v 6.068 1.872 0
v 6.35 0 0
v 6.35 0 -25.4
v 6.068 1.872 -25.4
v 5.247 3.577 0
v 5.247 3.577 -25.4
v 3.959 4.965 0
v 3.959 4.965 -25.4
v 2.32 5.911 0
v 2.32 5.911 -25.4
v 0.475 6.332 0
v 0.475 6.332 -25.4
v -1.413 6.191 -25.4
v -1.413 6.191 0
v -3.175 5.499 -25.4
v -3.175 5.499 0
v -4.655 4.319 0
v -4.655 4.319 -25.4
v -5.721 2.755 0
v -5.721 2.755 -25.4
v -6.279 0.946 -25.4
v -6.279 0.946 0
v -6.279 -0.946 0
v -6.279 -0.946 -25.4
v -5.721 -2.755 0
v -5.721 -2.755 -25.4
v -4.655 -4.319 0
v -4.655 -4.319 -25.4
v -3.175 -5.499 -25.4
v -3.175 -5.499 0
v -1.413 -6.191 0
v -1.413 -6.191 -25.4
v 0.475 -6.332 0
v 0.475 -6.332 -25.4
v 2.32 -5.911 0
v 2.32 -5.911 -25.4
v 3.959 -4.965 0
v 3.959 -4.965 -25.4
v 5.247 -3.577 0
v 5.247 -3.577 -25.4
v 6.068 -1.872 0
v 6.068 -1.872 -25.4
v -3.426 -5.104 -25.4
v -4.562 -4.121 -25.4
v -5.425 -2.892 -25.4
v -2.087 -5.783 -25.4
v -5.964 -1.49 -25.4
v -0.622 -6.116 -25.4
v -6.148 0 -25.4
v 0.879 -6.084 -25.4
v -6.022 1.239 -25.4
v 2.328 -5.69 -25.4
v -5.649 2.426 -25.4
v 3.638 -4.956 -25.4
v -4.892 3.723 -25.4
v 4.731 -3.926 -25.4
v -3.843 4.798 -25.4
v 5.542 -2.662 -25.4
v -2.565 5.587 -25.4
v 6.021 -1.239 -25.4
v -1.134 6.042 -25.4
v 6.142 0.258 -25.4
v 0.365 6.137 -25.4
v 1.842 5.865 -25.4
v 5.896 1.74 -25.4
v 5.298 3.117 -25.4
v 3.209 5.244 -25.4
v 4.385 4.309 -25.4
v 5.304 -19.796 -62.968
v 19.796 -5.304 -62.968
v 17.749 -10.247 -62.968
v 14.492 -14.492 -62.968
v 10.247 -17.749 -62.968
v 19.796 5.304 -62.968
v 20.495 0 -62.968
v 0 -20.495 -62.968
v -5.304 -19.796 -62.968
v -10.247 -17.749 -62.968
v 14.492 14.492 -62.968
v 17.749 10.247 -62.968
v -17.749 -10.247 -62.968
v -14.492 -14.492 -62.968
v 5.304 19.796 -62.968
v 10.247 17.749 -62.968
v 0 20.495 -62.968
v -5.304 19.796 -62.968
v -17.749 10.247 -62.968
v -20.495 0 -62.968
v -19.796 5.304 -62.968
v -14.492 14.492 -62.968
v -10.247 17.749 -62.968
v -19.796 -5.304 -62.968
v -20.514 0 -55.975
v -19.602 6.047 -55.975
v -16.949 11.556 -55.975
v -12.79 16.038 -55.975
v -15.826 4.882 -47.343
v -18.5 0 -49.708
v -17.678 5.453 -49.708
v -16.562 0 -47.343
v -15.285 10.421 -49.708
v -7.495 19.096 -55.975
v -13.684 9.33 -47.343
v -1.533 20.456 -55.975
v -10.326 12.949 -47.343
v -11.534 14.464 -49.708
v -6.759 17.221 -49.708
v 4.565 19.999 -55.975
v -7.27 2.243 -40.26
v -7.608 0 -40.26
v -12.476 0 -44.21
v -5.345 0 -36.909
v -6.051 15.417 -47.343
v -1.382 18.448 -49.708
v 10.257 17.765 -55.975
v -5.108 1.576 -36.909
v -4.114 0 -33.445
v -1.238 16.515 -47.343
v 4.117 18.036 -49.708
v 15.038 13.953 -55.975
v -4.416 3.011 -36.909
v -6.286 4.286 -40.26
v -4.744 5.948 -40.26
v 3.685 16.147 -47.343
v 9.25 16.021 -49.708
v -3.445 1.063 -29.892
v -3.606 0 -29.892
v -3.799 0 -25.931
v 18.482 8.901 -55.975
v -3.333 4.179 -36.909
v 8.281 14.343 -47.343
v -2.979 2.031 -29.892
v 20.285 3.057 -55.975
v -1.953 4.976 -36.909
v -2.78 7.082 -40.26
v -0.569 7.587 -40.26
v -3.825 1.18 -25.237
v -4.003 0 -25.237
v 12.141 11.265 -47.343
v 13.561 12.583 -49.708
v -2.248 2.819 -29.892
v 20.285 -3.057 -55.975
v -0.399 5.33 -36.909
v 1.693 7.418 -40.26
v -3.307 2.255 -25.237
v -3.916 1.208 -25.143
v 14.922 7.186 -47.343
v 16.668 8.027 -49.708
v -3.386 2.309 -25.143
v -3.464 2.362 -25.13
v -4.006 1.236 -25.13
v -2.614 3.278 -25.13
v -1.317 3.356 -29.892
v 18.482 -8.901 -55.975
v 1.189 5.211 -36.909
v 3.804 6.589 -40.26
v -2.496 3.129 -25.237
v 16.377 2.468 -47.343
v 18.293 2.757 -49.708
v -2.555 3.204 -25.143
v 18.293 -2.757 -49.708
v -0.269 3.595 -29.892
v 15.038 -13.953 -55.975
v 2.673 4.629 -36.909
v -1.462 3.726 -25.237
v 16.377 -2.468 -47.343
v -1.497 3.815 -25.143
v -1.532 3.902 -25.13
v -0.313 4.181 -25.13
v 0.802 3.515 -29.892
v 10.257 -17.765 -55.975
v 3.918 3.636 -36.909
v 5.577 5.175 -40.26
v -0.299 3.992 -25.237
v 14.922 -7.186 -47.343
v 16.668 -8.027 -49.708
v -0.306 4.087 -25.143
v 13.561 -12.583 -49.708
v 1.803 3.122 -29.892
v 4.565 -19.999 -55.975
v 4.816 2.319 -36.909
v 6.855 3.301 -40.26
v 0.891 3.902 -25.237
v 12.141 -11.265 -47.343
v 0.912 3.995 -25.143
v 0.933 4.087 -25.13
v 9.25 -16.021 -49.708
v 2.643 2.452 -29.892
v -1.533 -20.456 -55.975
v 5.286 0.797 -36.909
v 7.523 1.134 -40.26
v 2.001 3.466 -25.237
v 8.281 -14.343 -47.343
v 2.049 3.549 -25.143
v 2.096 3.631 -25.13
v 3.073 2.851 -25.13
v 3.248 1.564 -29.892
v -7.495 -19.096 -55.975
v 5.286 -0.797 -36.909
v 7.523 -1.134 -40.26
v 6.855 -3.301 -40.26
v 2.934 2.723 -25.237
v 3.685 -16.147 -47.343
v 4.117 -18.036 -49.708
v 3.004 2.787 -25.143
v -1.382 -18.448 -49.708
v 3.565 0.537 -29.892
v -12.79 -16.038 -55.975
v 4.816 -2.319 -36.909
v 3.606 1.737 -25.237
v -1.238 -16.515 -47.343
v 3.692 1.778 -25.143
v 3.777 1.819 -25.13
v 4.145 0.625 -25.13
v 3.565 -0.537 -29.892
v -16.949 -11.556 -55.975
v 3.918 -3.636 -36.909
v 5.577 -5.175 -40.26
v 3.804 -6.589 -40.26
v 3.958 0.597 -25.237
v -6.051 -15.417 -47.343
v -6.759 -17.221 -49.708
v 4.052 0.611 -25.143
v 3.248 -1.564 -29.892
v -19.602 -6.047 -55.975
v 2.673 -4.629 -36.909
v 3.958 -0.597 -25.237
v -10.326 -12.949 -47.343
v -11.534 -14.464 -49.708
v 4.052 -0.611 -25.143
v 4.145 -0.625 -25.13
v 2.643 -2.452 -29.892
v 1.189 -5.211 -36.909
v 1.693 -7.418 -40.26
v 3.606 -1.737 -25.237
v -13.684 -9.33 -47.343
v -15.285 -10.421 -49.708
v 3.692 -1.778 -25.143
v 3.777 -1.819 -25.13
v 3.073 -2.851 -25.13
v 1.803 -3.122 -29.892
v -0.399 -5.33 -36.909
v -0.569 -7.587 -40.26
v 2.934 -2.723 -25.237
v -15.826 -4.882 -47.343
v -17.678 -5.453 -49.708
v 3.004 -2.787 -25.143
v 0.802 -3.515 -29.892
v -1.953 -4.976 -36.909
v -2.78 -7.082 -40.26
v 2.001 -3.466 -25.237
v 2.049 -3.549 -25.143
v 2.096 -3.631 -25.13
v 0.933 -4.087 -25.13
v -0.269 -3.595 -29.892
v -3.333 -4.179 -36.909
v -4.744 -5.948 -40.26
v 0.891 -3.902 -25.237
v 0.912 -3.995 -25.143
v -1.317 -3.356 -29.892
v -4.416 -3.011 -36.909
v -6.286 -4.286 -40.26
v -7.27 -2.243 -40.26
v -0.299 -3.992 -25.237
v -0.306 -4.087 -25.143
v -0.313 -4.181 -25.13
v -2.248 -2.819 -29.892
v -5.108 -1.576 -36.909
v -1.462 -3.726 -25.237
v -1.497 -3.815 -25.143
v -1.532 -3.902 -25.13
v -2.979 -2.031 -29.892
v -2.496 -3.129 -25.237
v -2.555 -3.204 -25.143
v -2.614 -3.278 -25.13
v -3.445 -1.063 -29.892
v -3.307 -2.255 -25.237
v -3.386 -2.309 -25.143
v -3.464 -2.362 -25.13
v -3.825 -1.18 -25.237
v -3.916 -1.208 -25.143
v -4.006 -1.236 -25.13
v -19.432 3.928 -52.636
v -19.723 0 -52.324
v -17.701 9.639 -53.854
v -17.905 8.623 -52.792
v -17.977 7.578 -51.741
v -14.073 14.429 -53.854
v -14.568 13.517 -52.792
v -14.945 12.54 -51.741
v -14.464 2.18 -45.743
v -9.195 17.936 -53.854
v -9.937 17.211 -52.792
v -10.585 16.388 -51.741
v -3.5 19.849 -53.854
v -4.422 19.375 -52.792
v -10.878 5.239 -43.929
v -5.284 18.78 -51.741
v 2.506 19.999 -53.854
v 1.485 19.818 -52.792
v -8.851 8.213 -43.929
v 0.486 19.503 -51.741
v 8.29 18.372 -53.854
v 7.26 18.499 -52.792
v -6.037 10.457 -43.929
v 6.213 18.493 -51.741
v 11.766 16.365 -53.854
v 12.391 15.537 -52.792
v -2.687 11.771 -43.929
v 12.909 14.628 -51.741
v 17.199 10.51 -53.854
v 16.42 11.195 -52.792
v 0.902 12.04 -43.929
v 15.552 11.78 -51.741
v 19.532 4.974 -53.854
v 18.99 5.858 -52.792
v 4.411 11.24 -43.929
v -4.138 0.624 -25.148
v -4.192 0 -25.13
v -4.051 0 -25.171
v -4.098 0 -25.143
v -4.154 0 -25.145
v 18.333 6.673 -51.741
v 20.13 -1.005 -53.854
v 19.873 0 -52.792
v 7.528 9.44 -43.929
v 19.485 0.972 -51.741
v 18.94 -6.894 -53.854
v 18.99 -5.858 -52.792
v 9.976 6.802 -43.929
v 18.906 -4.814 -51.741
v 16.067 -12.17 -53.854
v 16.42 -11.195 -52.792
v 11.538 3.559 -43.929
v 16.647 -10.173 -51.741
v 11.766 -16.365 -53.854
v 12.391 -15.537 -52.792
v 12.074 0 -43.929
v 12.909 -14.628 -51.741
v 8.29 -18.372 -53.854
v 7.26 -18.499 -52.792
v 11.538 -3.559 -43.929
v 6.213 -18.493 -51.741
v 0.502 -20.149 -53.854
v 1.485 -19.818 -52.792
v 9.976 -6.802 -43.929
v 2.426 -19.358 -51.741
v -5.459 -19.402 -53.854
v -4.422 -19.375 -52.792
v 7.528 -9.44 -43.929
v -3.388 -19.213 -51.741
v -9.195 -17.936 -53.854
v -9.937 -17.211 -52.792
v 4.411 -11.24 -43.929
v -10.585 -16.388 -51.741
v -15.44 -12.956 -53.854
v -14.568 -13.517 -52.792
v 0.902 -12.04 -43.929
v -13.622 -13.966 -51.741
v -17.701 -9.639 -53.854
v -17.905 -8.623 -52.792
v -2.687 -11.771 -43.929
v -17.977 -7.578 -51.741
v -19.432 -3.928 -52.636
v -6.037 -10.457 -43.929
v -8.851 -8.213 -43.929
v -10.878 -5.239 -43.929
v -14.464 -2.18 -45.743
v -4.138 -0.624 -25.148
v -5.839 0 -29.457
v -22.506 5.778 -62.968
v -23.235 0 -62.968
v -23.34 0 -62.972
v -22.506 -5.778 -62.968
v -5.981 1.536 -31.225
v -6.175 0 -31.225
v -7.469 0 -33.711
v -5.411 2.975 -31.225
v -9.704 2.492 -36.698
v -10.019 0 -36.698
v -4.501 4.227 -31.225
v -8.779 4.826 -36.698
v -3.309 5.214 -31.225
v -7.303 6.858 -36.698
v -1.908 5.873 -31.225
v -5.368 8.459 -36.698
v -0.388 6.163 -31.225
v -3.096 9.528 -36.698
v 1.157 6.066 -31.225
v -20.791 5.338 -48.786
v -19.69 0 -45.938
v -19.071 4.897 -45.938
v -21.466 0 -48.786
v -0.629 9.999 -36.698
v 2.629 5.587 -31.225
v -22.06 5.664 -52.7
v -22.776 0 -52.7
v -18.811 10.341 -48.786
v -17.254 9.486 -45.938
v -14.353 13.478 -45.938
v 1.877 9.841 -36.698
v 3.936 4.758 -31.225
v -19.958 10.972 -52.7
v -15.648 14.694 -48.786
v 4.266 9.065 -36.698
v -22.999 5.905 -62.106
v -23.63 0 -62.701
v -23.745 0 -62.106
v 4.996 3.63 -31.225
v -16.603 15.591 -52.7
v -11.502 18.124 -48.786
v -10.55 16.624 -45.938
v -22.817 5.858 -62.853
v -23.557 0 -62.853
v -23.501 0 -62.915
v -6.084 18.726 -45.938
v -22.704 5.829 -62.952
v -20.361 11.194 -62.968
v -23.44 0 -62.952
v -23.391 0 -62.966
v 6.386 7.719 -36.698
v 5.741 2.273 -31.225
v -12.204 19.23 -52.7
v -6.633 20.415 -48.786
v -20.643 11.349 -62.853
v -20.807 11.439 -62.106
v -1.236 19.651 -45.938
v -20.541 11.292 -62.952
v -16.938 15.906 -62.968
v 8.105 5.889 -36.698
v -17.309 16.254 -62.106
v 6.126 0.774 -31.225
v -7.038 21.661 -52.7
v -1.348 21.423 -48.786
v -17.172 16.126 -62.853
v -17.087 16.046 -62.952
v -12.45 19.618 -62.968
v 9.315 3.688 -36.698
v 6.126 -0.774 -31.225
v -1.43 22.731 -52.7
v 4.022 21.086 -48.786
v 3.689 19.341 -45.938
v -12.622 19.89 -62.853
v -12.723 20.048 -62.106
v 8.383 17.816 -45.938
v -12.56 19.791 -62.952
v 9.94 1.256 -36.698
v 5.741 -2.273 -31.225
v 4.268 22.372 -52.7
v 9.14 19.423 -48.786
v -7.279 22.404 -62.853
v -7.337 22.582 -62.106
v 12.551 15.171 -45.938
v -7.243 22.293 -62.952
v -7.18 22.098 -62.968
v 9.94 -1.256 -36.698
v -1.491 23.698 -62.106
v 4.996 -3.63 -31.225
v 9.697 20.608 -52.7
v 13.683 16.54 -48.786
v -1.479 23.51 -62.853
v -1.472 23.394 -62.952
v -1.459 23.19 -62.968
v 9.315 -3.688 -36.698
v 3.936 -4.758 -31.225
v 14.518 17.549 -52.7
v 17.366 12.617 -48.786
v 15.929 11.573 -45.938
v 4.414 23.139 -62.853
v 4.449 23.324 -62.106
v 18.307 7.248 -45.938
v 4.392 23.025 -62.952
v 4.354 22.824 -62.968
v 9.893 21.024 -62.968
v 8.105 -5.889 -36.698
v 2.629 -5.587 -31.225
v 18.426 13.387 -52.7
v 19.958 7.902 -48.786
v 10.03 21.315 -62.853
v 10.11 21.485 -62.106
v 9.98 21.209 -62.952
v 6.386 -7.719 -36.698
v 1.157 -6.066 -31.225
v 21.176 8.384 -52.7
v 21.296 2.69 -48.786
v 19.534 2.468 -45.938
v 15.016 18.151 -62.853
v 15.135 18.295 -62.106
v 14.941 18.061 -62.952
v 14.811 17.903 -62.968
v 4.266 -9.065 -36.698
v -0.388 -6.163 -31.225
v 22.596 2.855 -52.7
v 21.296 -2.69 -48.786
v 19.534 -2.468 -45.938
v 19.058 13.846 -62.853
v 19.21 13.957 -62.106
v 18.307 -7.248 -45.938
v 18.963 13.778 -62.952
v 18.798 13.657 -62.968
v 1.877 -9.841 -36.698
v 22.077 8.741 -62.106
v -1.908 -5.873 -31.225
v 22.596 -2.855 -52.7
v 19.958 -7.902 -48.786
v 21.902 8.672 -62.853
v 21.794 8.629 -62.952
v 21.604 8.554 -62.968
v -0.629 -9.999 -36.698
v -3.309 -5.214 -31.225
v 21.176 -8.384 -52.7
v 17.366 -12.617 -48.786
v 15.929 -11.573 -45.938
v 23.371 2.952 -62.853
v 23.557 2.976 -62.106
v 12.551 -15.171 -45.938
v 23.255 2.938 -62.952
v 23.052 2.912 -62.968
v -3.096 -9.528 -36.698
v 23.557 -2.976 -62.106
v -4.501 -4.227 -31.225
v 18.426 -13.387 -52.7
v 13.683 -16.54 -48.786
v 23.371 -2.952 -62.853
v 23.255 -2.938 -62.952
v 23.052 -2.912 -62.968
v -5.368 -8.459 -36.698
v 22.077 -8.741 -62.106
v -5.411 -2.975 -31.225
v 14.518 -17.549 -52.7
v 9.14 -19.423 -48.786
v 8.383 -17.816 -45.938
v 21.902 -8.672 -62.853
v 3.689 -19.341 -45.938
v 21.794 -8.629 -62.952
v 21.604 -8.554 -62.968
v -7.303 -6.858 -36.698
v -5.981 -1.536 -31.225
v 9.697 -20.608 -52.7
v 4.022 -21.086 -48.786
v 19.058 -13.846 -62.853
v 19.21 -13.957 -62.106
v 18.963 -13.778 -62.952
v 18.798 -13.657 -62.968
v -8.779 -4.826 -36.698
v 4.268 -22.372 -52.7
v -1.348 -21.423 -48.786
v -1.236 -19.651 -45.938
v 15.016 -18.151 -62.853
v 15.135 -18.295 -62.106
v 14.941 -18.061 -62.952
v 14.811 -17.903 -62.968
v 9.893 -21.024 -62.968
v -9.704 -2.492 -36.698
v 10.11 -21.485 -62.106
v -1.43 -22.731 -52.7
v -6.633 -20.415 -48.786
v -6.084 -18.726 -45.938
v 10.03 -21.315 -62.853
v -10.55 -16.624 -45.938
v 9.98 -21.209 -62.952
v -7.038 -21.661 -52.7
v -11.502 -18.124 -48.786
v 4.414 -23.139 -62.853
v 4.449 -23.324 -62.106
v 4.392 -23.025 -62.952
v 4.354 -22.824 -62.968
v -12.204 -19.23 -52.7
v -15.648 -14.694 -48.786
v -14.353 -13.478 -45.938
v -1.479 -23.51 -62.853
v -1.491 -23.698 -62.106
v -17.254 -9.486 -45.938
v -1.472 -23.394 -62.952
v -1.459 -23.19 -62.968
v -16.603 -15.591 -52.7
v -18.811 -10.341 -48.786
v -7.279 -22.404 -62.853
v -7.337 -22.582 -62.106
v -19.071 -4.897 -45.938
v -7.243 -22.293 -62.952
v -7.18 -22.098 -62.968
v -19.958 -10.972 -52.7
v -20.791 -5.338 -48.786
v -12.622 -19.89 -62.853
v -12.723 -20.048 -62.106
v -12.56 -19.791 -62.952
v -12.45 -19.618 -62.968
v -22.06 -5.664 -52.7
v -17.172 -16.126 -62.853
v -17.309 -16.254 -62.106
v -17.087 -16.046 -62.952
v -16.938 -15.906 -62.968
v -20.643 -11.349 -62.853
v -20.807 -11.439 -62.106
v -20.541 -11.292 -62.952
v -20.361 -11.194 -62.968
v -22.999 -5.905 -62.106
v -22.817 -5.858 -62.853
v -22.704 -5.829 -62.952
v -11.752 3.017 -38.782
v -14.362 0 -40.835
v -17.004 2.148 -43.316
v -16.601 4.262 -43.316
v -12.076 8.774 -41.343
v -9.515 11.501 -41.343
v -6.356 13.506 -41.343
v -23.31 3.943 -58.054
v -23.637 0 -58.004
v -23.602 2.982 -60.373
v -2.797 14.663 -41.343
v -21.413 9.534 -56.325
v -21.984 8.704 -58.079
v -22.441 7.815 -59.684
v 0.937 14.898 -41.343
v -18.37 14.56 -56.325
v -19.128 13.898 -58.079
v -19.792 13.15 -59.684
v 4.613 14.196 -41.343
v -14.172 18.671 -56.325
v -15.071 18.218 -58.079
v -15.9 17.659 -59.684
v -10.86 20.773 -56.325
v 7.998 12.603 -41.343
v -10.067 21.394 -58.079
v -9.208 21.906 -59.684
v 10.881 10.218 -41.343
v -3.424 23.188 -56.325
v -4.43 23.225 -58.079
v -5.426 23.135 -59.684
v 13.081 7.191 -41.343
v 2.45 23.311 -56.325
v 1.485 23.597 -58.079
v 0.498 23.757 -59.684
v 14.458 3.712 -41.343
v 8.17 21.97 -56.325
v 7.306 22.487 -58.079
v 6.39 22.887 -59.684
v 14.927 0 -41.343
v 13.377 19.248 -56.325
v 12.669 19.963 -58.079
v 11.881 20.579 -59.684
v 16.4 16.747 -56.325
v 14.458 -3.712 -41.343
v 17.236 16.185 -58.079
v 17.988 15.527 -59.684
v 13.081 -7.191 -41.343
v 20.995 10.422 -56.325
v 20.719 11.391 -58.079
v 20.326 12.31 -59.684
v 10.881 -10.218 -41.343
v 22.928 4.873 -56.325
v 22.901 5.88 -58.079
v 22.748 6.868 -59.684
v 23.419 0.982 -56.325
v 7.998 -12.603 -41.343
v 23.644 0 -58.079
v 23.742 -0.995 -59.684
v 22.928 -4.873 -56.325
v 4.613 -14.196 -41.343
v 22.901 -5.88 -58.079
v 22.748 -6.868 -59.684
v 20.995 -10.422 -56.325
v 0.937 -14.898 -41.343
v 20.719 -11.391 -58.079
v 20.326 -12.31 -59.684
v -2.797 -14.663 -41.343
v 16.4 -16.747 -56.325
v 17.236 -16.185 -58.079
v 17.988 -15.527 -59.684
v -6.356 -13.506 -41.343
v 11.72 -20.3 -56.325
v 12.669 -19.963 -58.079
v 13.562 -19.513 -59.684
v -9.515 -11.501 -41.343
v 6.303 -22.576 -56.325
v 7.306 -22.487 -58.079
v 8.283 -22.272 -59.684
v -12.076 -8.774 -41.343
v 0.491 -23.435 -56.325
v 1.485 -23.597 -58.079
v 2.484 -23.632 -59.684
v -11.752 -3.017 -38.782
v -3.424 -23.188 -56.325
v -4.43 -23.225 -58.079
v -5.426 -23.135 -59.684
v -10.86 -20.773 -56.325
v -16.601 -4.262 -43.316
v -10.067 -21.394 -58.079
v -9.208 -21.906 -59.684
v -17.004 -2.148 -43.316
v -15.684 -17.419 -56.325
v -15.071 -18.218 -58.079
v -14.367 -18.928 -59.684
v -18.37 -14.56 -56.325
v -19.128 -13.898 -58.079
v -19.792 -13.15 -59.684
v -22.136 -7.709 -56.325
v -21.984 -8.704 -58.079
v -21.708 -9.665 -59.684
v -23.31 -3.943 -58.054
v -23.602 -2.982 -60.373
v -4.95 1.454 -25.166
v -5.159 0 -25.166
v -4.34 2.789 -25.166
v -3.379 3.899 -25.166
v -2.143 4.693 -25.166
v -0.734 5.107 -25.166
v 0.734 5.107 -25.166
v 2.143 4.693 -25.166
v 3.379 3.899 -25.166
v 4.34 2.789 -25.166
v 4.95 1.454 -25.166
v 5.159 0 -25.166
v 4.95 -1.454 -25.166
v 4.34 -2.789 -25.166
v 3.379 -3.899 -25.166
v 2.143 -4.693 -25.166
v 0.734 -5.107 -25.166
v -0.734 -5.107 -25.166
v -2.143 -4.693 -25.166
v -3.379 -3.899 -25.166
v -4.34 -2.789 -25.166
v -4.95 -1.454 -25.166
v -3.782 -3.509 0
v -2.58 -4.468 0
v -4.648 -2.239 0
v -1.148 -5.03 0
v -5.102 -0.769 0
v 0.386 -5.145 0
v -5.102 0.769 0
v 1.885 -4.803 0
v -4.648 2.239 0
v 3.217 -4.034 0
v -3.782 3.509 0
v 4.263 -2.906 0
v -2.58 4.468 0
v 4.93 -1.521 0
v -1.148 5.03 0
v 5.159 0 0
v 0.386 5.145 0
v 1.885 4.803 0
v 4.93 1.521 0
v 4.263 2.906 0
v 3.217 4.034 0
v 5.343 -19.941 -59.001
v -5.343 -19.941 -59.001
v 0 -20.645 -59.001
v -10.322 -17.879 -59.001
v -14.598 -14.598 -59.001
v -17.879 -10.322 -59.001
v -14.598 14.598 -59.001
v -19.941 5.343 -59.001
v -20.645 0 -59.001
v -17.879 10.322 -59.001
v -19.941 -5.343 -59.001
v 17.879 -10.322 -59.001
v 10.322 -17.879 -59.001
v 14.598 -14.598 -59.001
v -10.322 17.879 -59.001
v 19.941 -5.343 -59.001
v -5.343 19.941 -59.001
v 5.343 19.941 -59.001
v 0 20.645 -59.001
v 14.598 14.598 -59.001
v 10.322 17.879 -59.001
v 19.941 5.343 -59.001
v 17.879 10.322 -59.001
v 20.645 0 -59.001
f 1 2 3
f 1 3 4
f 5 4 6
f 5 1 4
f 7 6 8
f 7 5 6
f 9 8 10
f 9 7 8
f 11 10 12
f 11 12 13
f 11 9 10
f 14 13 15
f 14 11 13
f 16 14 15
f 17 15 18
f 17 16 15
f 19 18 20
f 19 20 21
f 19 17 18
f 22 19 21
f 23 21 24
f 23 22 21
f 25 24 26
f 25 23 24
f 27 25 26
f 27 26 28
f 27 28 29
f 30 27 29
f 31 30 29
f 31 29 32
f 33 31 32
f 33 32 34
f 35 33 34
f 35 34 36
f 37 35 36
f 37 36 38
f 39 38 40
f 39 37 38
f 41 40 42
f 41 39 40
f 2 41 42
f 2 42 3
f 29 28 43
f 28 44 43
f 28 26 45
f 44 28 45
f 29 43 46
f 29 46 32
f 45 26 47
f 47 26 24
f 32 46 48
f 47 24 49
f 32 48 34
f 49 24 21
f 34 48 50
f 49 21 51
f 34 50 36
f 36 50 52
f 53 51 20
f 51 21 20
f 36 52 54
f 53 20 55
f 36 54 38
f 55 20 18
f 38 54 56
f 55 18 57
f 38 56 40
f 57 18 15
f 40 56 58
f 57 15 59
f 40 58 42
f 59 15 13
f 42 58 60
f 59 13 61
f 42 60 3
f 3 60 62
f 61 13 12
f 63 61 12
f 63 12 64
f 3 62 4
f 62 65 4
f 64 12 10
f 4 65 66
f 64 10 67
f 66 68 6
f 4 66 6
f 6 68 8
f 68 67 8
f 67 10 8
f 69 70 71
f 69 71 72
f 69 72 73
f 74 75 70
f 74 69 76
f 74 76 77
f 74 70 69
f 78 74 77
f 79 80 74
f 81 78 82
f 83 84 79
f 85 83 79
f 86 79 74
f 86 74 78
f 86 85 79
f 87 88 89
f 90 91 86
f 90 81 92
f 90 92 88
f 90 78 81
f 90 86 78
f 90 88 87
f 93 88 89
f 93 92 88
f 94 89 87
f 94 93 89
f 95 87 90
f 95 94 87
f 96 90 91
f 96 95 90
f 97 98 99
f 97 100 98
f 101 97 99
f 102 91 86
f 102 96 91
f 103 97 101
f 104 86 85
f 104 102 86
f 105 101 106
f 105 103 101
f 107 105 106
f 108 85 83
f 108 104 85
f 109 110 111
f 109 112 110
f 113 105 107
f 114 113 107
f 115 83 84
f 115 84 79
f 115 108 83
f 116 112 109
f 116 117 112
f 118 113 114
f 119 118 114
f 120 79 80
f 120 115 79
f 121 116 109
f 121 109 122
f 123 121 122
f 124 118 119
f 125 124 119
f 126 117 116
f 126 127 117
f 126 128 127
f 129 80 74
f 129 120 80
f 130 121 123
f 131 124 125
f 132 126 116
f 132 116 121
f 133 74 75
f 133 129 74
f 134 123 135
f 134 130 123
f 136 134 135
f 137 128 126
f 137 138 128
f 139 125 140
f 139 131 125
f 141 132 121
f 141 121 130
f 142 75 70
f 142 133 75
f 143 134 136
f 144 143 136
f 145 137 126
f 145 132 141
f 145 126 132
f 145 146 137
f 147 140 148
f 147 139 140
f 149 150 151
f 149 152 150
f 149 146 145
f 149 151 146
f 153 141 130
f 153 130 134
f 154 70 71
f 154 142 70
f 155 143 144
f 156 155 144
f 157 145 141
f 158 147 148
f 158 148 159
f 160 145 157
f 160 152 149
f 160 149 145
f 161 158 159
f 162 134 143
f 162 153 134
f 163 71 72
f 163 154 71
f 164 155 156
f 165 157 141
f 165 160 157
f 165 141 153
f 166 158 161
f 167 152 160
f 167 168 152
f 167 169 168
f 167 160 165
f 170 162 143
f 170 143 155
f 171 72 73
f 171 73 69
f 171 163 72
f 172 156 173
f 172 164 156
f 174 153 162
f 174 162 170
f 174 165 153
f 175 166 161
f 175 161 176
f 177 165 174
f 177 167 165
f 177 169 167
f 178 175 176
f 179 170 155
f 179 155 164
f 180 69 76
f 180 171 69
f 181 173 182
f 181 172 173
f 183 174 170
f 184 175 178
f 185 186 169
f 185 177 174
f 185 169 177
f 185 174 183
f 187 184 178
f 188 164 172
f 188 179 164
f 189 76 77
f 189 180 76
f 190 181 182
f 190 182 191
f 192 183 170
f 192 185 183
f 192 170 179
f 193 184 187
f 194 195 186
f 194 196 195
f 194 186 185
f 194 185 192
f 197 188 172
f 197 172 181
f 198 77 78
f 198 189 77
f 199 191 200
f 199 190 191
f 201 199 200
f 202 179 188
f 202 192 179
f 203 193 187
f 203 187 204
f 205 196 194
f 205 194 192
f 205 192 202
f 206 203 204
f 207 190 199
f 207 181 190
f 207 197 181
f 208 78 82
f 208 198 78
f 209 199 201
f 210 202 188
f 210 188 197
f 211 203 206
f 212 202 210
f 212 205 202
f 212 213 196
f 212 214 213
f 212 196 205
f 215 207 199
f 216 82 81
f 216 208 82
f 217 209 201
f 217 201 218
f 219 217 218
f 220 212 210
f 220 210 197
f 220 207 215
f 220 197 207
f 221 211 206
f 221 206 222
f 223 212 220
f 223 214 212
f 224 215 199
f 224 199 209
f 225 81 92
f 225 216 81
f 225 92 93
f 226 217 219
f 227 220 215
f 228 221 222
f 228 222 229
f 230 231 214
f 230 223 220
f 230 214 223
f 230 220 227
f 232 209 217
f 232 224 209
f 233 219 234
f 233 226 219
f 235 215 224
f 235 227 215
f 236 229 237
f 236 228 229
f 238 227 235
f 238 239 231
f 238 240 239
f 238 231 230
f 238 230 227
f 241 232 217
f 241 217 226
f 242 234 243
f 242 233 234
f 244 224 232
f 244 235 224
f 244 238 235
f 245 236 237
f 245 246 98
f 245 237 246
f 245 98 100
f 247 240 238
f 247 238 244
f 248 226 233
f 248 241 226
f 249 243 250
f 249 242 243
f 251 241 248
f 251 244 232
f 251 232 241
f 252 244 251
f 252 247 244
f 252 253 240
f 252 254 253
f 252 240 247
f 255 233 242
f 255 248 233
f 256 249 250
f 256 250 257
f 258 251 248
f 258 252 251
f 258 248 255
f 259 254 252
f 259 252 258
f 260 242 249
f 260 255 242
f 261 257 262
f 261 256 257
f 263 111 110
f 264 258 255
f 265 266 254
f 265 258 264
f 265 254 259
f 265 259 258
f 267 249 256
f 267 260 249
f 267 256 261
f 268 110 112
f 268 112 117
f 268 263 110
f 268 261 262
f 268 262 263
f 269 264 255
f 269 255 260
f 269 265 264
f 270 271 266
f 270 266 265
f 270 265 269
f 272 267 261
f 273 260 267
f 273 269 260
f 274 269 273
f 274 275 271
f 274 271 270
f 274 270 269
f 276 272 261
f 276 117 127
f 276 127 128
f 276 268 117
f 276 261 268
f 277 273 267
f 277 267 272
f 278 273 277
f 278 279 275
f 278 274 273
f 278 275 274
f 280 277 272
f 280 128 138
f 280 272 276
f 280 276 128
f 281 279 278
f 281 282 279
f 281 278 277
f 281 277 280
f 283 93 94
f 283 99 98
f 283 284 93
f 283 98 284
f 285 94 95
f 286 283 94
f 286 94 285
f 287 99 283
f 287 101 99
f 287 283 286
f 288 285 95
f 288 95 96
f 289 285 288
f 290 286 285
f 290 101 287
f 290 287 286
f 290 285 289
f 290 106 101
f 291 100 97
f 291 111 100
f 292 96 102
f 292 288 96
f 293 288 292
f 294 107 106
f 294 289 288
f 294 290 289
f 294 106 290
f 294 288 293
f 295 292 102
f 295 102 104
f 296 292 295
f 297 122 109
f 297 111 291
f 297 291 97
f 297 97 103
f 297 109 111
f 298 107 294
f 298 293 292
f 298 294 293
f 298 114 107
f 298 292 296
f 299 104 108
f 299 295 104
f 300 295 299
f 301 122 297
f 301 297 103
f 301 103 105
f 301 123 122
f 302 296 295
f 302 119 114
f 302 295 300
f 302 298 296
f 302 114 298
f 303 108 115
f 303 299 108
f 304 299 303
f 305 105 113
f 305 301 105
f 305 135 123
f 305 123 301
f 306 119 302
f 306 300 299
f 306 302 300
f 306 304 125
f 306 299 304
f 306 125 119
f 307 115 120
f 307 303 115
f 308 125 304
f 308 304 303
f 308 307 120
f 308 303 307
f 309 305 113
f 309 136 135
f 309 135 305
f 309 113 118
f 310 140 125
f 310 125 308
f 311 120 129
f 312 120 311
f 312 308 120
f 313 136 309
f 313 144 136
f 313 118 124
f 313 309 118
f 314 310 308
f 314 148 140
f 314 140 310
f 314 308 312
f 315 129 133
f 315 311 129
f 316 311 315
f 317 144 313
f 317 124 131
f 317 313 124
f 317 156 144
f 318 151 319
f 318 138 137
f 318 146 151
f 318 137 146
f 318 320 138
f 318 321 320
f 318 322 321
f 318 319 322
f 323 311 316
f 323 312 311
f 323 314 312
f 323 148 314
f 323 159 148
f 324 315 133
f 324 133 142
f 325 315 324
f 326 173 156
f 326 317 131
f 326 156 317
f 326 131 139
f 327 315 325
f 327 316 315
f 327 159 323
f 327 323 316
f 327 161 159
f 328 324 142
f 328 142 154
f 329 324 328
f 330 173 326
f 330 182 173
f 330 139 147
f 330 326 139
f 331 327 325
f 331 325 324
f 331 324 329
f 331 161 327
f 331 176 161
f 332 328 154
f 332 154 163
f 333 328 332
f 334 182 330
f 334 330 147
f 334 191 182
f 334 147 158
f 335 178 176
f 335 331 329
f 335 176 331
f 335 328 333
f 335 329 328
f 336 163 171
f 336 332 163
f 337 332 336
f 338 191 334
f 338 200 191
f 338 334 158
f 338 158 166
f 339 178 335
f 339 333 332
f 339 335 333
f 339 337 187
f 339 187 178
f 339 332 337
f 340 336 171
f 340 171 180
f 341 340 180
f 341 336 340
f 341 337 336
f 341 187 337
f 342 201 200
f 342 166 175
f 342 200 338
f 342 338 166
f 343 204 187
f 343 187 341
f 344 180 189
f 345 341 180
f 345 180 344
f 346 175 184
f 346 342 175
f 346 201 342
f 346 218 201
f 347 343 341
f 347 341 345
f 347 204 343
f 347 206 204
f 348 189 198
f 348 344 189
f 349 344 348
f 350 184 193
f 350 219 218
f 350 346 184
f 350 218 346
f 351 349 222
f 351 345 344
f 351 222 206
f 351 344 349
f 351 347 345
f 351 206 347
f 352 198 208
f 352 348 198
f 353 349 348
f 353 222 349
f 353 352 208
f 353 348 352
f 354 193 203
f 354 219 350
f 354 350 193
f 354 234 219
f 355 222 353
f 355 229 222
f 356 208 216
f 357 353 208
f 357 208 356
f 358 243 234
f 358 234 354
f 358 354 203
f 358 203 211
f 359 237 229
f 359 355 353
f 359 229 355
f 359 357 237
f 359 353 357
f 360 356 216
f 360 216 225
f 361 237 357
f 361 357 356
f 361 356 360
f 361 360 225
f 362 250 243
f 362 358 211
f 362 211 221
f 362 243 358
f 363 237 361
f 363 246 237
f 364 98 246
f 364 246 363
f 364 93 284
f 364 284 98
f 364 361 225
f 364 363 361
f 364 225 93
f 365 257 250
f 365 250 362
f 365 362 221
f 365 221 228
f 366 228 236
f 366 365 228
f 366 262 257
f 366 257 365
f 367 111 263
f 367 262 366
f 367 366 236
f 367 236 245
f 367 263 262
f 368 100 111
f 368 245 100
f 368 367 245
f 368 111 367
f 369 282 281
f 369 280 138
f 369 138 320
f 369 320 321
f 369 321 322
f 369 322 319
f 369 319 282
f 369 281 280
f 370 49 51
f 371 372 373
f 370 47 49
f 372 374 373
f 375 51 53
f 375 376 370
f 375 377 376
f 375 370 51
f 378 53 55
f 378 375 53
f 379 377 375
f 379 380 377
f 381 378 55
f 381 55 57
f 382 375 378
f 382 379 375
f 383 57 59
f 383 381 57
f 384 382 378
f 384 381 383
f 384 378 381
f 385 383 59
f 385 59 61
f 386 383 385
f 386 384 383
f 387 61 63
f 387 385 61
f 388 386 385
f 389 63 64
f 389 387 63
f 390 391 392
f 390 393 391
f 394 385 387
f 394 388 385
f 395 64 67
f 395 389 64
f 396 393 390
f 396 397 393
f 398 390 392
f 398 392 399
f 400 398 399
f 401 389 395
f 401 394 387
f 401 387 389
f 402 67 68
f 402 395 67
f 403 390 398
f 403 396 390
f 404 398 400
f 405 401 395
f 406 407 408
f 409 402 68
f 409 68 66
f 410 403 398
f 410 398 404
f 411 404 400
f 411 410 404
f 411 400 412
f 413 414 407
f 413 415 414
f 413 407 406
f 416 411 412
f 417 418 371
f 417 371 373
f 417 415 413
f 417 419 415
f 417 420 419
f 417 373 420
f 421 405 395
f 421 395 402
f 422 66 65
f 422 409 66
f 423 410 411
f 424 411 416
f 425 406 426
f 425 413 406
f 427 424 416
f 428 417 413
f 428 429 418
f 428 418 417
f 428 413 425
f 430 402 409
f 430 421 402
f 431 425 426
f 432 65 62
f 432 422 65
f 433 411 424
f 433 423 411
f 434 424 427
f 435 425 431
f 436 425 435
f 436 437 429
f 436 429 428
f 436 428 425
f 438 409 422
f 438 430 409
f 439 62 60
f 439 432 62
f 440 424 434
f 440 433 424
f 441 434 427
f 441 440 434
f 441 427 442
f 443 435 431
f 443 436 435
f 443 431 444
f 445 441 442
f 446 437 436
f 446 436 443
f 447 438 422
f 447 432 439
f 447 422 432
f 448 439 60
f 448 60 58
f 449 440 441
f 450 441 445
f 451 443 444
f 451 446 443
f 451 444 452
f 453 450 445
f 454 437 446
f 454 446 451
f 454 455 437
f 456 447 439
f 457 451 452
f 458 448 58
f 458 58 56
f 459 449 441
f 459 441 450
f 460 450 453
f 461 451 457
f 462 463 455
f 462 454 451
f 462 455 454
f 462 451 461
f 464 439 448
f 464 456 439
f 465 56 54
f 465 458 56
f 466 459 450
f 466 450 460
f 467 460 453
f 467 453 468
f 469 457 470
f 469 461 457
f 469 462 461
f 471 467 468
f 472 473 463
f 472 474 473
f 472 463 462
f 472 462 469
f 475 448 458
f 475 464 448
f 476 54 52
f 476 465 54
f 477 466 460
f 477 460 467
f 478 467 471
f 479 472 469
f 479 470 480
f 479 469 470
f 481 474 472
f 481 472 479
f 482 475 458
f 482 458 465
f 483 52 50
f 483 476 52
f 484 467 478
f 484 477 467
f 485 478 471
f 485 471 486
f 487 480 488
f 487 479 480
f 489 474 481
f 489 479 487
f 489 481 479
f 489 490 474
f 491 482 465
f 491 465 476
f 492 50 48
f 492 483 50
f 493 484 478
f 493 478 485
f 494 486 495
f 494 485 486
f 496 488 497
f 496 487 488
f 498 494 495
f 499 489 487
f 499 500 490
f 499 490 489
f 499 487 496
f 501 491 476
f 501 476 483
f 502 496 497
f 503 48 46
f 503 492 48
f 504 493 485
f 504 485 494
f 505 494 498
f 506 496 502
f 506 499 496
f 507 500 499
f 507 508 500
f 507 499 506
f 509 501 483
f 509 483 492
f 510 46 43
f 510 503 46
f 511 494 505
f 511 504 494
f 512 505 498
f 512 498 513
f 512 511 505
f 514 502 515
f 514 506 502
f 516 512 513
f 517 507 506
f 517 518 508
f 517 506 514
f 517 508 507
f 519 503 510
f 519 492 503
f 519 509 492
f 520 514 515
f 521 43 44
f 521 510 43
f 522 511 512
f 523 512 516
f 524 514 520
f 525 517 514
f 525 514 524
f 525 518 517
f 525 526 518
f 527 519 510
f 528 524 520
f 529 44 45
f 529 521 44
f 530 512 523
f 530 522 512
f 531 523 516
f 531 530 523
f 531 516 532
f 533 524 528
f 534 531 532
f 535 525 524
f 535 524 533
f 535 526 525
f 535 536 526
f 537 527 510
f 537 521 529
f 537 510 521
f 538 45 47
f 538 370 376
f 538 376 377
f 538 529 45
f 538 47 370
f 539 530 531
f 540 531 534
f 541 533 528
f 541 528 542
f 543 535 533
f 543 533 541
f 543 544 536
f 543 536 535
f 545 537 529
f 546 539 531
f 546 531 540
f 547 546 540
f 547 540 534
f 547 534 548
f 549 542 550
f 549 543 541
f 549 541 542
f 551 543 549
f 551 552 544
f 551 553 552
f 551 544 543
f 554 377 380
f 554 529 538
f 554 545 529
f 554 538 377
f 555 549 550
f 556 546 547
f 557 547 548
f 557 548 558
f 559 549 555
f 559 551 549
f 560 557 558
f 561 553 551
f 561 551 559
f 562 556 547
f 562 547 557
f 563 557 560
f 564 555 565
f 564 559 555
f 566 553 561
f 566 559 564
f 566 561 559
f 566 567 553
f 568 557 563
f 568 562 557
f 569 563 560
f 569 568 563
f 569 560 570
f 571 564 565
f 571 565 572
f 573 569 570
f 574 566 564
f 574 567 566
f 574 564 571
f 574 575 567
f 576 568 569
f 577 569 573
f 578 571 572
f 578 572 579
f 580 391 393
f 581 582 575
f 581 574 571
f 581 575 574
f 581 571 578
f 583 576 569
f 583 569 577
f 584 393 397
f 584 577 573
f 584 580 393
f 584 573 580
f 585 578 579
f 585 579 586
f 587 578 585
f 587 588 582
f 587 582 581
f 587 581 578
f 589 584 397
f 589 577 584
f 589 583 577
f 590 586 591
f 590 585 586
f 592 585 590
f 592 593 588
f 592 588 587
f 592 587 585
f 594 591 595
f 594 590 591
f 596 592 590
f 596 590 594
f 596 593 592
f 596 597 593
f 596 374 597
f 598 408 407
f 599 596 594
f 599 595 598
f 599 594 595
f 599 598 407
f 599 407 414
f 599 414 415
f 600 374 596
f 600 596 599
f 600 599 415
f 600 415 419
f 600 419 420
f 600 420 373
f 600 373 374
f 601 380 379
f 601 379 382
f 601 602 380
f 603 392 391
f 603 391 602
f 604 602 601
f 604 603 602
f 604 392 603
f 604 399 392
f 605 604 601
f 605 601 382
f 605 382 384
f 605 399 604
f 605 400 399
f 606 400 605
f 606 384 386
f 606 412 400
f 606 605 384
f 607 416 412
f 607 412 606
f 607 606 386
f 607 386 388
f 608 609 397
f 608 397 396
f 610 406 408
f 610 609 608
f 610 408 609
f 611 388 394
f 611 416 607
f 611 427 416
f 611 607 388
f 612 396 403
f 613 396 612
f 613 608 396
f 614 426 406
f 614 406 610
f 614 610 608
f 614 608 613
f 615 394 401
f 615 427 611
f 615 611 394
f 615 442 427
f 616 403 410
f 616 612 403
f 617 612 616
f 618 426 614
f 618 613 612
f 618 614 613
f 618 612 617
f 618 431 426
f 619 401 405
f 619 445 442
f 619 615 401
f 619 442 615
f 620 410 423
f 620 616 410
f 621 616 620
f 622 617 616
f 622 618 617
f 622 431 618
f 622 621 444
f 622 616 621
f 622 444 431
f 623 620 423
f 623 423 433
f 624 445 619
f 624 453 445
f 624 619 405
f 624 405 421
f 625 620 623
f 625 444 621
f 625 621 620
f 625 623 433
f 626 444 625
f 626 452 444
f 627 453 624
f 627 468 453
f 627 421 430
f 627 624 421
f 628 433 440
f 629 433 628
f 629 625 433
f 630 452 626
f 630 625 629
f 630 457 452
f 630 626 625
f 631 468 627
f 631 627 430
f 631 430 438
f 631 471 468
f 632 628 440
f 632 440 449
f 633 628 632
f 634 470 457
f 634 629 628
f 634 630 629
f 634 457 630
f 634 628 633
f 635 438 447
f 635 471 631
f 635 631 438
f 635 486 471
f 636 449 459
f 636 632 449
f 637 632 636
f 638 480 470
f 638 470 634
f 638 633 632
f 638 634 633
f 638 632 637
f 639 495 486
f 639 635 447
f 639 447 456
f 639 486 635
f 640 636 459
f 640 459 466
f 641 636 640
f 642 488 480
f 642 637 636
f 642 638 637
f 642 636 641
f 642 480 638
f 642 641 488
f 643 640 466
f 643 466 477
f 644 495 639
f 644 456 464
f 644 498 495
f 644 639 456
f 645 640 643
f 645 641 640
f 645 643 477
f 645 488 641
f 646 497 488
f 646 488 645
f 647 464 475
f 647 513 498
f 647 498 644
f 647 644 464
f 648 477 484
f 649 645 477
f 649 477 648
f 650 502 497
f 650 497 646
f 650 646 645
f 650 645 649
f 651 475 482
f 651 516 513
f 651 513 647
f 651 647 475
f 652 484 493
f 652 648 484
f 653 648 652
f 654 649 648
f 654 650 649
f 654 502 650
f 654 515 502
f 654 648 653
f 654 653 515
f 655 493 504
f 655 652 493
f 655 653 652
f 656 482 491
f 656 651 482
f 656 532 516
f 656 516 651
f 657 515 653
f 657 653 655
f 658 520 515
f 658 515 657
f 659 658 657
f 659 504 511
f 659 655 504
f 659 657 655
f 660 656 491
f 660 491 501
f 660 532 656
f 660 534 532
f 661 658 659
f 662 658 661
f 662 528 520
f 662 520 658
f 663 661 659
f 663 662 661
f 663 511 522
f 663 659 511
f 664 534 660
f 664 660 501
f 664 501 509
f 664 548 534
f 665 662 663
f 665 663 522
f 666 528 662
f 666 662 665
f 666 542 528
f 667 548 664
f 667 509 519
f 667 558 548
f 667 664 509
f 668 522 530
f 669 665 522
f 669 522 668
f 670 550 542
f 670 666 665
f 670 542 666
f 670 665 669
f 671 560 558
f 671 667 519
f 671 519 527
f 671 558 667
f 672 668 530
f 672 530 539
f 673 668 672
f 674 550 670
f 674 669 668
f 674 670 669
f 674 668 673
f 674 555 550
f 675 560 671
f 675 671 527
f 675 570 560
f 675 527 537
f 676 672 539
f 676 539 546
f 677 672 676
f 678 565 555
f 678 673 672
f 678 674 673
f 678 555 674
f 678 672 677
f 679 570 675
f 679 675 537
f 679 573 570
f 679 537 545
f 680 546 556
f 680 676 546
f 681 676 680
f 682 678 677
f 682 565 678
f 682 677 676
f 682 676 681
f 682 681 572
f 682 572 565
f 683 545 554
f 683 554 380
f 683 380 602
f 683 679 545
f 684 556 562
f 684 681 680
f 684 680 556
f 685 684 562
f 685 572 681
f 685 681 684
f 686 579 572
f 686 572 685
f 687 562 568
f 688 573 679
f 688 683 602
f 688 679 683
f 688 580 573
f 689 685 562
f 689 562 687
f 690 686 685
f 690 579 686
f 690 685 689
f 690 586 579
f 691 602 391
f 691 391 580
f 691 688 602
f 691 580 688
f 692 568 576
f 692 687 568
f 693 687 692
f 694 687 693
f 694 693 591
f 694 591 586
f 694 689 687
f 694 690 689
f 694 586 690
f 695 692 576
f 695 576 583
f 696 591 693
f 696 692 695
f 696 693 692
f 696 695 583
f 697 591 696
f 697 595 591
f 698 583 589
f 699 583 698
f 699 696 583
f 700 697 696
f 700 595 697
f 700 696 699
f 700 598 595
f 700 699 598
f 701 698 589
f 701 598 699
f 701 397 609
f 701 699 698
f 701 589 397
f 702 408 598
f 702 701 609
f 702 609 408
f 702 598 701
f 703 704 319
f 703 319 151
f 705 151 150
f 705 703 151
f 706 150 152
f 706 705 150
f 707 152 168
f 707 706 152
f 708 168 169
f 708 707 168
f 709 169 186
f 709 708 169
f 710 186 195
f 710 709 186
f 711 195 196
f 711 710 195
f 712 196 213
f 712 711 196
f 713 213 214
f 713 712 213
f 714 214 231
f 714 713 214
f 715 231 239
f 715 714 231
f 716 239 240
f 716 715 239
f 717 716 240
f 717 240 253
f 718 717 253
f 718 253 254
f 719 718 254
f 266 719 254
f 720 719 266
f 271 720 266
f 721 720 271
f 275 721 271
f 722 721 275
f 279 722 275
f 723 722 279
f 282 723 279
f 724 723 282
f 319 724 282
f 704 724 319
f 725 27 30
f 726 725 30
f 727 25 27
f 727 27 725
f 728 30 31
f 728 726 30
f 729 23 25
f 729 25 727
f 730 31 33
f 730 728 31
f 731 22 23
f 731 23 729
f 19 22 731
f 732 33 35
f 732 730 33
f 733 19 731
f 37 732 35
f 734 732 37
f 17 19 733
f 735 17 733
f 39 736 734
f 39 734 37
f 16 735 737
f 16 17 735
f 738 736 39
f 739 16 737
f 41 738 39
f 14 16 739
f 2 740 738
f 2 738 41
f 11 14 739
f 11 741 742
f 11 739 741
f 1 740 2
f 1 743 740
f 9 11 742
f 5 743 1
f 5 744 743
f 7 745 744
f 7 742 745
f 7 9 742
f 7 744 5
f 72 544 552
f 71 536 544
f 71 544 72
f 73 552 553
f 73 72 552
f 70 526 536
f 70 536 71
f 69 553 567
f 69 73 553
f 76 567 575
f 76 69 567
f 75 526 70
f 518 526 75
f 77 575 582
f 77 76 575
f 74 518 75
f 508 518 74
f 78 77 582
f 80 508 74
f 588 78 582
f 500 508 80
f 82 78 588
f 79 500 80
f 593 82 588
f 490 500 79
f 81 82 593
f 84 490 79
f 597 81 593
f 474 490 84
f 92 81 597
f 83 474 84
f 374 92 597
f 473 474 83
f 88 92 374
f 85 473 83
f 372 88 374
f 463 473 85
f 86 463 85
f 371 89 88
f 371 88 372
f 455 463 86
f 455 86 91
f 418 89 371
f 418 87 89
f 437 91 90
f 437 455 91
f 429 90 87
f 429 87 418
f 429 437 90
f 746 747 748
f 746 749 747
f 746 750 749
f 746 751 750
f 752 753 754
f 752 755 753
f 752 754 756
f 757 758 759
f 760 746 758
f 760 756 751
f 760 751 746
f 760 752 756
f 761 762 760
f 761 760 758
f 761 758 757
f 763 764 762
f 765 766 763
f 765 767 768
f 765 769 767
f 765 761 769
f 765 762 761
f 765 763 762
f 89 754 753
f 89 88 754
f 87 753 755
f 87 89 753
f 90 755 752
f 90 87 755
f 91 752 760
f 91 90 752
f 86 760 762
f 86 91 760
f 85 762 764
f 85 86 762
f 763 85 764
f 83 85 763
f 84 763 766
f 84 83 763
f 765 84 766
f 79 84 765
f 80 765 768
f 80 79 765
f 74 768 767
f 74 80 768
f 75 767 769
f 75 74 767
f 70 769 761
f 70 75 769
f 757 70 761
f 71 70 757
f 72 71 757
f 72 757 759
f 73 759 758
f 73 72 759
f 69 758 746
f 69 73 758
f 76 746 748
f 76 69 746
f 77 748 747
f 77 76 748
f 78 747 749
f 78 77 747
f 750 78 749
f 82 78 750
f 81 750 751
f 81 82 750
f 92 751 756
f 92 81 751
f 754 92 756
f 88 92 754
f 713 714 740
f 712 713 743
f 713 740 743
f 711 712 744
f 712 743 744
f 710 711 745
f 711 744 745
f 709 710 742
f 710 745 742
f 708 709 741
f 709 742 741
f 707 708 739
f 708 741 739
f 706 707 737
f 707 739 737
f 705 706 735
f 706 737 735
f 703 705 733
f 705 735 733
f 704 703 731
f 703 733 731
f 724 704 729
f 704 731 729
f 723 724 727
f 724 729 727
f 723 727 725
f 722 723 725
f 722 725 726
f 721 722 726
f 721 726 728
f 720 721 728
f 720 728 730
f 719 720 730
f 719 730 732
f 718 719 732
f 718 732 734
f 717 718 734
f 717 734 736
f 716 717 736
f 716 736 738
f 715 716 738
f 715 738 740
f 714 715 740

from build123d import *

# Parameters (mm, degrees)
F0_R     = 6.35
F0_R_2   = 5.159236224
F1_DEPTH = 25.4


with BuildPart() as f1:
    # F0 (on Top) → F1 (new body)
    with BuildSketch(Plane.XY):
        Circle(F0_R)
        Circle(F0_R_2, mode=Mode.SUBTRACT)
    extrude(amount=-F1_DEPTH)

    # F2 (on Front) → F3 (revolve)
    with BuildSketch(Plane.XZ):
        with BuildLine():
            Line((-4.1922661476, -25.1300428063), (-6.1774905771, -25.2033080906))
            add(Edge.make_bspline(
                [(-6.1774905771, -25.2033080906), (-5.8816901728, -27.1447096862), (-5.265303085, -31.1901905517), (-9.7481884082, -36.7369563101), (-16.6138781886, -42.8504666243), (-23.2235490745, -48.7039542033), (-24.2056607787, -63.0380862229), (-23.3609294322, -62.977042473), (-23.2354998589, -62.9679784179)],
                knots=[0, 0, 0, 0, 0.156554679, 0.3262276903, 0.5234958336, 0.7281329257, 0.9596319336, 1, 1, 1, 1], degree=3))
            Line((-23.2354998589, -62.9679784179), (-20.4945225269, -62.9679784179))
            add(Edge.make_bspline(
                [(-20.4945225269, -62.9679784179), (-20.6448482141, -60.624451722), (-20.9589297237, -55.7280270615), (-18.2599448452, -46.8433730683), (-6.1501049149, -41.3581316698), (-3.0279588772, -30.9205125456), (-3.8334857362, -24.9599734502), (-4.1873255513, -25.1639760168), (-4.1910948215, -25.1380877569), (-4.1922661476, -25.1300428063)],
                knots=[0, 0, 0, 0, 0.1774907083, 0.3708384814, 0.6049164544, 0.8251216274, 0.9695417285, 0.9905348876, 1, 1, 1, 1], degree=3))
        make_face()
    revolve(axis=Axis((0, 0, -40.8029872924), (0, 0, -1)))


with BuildPart() as f4:
    # F2 (on Front) → F4 (revolve)
    with BuildSketch(Plane.XZ):
        Polygon((-20.6448482141, -59.0007714927), (-20.4945225269, -62.9679784179), (0, -62.9679784179), (0, -59.0007714927), align=None)
    revolve(axis=Axis((0, 0, -40.8029872924), (0, 0, -1)))


solid = Compound([f1.part, f4.part])
